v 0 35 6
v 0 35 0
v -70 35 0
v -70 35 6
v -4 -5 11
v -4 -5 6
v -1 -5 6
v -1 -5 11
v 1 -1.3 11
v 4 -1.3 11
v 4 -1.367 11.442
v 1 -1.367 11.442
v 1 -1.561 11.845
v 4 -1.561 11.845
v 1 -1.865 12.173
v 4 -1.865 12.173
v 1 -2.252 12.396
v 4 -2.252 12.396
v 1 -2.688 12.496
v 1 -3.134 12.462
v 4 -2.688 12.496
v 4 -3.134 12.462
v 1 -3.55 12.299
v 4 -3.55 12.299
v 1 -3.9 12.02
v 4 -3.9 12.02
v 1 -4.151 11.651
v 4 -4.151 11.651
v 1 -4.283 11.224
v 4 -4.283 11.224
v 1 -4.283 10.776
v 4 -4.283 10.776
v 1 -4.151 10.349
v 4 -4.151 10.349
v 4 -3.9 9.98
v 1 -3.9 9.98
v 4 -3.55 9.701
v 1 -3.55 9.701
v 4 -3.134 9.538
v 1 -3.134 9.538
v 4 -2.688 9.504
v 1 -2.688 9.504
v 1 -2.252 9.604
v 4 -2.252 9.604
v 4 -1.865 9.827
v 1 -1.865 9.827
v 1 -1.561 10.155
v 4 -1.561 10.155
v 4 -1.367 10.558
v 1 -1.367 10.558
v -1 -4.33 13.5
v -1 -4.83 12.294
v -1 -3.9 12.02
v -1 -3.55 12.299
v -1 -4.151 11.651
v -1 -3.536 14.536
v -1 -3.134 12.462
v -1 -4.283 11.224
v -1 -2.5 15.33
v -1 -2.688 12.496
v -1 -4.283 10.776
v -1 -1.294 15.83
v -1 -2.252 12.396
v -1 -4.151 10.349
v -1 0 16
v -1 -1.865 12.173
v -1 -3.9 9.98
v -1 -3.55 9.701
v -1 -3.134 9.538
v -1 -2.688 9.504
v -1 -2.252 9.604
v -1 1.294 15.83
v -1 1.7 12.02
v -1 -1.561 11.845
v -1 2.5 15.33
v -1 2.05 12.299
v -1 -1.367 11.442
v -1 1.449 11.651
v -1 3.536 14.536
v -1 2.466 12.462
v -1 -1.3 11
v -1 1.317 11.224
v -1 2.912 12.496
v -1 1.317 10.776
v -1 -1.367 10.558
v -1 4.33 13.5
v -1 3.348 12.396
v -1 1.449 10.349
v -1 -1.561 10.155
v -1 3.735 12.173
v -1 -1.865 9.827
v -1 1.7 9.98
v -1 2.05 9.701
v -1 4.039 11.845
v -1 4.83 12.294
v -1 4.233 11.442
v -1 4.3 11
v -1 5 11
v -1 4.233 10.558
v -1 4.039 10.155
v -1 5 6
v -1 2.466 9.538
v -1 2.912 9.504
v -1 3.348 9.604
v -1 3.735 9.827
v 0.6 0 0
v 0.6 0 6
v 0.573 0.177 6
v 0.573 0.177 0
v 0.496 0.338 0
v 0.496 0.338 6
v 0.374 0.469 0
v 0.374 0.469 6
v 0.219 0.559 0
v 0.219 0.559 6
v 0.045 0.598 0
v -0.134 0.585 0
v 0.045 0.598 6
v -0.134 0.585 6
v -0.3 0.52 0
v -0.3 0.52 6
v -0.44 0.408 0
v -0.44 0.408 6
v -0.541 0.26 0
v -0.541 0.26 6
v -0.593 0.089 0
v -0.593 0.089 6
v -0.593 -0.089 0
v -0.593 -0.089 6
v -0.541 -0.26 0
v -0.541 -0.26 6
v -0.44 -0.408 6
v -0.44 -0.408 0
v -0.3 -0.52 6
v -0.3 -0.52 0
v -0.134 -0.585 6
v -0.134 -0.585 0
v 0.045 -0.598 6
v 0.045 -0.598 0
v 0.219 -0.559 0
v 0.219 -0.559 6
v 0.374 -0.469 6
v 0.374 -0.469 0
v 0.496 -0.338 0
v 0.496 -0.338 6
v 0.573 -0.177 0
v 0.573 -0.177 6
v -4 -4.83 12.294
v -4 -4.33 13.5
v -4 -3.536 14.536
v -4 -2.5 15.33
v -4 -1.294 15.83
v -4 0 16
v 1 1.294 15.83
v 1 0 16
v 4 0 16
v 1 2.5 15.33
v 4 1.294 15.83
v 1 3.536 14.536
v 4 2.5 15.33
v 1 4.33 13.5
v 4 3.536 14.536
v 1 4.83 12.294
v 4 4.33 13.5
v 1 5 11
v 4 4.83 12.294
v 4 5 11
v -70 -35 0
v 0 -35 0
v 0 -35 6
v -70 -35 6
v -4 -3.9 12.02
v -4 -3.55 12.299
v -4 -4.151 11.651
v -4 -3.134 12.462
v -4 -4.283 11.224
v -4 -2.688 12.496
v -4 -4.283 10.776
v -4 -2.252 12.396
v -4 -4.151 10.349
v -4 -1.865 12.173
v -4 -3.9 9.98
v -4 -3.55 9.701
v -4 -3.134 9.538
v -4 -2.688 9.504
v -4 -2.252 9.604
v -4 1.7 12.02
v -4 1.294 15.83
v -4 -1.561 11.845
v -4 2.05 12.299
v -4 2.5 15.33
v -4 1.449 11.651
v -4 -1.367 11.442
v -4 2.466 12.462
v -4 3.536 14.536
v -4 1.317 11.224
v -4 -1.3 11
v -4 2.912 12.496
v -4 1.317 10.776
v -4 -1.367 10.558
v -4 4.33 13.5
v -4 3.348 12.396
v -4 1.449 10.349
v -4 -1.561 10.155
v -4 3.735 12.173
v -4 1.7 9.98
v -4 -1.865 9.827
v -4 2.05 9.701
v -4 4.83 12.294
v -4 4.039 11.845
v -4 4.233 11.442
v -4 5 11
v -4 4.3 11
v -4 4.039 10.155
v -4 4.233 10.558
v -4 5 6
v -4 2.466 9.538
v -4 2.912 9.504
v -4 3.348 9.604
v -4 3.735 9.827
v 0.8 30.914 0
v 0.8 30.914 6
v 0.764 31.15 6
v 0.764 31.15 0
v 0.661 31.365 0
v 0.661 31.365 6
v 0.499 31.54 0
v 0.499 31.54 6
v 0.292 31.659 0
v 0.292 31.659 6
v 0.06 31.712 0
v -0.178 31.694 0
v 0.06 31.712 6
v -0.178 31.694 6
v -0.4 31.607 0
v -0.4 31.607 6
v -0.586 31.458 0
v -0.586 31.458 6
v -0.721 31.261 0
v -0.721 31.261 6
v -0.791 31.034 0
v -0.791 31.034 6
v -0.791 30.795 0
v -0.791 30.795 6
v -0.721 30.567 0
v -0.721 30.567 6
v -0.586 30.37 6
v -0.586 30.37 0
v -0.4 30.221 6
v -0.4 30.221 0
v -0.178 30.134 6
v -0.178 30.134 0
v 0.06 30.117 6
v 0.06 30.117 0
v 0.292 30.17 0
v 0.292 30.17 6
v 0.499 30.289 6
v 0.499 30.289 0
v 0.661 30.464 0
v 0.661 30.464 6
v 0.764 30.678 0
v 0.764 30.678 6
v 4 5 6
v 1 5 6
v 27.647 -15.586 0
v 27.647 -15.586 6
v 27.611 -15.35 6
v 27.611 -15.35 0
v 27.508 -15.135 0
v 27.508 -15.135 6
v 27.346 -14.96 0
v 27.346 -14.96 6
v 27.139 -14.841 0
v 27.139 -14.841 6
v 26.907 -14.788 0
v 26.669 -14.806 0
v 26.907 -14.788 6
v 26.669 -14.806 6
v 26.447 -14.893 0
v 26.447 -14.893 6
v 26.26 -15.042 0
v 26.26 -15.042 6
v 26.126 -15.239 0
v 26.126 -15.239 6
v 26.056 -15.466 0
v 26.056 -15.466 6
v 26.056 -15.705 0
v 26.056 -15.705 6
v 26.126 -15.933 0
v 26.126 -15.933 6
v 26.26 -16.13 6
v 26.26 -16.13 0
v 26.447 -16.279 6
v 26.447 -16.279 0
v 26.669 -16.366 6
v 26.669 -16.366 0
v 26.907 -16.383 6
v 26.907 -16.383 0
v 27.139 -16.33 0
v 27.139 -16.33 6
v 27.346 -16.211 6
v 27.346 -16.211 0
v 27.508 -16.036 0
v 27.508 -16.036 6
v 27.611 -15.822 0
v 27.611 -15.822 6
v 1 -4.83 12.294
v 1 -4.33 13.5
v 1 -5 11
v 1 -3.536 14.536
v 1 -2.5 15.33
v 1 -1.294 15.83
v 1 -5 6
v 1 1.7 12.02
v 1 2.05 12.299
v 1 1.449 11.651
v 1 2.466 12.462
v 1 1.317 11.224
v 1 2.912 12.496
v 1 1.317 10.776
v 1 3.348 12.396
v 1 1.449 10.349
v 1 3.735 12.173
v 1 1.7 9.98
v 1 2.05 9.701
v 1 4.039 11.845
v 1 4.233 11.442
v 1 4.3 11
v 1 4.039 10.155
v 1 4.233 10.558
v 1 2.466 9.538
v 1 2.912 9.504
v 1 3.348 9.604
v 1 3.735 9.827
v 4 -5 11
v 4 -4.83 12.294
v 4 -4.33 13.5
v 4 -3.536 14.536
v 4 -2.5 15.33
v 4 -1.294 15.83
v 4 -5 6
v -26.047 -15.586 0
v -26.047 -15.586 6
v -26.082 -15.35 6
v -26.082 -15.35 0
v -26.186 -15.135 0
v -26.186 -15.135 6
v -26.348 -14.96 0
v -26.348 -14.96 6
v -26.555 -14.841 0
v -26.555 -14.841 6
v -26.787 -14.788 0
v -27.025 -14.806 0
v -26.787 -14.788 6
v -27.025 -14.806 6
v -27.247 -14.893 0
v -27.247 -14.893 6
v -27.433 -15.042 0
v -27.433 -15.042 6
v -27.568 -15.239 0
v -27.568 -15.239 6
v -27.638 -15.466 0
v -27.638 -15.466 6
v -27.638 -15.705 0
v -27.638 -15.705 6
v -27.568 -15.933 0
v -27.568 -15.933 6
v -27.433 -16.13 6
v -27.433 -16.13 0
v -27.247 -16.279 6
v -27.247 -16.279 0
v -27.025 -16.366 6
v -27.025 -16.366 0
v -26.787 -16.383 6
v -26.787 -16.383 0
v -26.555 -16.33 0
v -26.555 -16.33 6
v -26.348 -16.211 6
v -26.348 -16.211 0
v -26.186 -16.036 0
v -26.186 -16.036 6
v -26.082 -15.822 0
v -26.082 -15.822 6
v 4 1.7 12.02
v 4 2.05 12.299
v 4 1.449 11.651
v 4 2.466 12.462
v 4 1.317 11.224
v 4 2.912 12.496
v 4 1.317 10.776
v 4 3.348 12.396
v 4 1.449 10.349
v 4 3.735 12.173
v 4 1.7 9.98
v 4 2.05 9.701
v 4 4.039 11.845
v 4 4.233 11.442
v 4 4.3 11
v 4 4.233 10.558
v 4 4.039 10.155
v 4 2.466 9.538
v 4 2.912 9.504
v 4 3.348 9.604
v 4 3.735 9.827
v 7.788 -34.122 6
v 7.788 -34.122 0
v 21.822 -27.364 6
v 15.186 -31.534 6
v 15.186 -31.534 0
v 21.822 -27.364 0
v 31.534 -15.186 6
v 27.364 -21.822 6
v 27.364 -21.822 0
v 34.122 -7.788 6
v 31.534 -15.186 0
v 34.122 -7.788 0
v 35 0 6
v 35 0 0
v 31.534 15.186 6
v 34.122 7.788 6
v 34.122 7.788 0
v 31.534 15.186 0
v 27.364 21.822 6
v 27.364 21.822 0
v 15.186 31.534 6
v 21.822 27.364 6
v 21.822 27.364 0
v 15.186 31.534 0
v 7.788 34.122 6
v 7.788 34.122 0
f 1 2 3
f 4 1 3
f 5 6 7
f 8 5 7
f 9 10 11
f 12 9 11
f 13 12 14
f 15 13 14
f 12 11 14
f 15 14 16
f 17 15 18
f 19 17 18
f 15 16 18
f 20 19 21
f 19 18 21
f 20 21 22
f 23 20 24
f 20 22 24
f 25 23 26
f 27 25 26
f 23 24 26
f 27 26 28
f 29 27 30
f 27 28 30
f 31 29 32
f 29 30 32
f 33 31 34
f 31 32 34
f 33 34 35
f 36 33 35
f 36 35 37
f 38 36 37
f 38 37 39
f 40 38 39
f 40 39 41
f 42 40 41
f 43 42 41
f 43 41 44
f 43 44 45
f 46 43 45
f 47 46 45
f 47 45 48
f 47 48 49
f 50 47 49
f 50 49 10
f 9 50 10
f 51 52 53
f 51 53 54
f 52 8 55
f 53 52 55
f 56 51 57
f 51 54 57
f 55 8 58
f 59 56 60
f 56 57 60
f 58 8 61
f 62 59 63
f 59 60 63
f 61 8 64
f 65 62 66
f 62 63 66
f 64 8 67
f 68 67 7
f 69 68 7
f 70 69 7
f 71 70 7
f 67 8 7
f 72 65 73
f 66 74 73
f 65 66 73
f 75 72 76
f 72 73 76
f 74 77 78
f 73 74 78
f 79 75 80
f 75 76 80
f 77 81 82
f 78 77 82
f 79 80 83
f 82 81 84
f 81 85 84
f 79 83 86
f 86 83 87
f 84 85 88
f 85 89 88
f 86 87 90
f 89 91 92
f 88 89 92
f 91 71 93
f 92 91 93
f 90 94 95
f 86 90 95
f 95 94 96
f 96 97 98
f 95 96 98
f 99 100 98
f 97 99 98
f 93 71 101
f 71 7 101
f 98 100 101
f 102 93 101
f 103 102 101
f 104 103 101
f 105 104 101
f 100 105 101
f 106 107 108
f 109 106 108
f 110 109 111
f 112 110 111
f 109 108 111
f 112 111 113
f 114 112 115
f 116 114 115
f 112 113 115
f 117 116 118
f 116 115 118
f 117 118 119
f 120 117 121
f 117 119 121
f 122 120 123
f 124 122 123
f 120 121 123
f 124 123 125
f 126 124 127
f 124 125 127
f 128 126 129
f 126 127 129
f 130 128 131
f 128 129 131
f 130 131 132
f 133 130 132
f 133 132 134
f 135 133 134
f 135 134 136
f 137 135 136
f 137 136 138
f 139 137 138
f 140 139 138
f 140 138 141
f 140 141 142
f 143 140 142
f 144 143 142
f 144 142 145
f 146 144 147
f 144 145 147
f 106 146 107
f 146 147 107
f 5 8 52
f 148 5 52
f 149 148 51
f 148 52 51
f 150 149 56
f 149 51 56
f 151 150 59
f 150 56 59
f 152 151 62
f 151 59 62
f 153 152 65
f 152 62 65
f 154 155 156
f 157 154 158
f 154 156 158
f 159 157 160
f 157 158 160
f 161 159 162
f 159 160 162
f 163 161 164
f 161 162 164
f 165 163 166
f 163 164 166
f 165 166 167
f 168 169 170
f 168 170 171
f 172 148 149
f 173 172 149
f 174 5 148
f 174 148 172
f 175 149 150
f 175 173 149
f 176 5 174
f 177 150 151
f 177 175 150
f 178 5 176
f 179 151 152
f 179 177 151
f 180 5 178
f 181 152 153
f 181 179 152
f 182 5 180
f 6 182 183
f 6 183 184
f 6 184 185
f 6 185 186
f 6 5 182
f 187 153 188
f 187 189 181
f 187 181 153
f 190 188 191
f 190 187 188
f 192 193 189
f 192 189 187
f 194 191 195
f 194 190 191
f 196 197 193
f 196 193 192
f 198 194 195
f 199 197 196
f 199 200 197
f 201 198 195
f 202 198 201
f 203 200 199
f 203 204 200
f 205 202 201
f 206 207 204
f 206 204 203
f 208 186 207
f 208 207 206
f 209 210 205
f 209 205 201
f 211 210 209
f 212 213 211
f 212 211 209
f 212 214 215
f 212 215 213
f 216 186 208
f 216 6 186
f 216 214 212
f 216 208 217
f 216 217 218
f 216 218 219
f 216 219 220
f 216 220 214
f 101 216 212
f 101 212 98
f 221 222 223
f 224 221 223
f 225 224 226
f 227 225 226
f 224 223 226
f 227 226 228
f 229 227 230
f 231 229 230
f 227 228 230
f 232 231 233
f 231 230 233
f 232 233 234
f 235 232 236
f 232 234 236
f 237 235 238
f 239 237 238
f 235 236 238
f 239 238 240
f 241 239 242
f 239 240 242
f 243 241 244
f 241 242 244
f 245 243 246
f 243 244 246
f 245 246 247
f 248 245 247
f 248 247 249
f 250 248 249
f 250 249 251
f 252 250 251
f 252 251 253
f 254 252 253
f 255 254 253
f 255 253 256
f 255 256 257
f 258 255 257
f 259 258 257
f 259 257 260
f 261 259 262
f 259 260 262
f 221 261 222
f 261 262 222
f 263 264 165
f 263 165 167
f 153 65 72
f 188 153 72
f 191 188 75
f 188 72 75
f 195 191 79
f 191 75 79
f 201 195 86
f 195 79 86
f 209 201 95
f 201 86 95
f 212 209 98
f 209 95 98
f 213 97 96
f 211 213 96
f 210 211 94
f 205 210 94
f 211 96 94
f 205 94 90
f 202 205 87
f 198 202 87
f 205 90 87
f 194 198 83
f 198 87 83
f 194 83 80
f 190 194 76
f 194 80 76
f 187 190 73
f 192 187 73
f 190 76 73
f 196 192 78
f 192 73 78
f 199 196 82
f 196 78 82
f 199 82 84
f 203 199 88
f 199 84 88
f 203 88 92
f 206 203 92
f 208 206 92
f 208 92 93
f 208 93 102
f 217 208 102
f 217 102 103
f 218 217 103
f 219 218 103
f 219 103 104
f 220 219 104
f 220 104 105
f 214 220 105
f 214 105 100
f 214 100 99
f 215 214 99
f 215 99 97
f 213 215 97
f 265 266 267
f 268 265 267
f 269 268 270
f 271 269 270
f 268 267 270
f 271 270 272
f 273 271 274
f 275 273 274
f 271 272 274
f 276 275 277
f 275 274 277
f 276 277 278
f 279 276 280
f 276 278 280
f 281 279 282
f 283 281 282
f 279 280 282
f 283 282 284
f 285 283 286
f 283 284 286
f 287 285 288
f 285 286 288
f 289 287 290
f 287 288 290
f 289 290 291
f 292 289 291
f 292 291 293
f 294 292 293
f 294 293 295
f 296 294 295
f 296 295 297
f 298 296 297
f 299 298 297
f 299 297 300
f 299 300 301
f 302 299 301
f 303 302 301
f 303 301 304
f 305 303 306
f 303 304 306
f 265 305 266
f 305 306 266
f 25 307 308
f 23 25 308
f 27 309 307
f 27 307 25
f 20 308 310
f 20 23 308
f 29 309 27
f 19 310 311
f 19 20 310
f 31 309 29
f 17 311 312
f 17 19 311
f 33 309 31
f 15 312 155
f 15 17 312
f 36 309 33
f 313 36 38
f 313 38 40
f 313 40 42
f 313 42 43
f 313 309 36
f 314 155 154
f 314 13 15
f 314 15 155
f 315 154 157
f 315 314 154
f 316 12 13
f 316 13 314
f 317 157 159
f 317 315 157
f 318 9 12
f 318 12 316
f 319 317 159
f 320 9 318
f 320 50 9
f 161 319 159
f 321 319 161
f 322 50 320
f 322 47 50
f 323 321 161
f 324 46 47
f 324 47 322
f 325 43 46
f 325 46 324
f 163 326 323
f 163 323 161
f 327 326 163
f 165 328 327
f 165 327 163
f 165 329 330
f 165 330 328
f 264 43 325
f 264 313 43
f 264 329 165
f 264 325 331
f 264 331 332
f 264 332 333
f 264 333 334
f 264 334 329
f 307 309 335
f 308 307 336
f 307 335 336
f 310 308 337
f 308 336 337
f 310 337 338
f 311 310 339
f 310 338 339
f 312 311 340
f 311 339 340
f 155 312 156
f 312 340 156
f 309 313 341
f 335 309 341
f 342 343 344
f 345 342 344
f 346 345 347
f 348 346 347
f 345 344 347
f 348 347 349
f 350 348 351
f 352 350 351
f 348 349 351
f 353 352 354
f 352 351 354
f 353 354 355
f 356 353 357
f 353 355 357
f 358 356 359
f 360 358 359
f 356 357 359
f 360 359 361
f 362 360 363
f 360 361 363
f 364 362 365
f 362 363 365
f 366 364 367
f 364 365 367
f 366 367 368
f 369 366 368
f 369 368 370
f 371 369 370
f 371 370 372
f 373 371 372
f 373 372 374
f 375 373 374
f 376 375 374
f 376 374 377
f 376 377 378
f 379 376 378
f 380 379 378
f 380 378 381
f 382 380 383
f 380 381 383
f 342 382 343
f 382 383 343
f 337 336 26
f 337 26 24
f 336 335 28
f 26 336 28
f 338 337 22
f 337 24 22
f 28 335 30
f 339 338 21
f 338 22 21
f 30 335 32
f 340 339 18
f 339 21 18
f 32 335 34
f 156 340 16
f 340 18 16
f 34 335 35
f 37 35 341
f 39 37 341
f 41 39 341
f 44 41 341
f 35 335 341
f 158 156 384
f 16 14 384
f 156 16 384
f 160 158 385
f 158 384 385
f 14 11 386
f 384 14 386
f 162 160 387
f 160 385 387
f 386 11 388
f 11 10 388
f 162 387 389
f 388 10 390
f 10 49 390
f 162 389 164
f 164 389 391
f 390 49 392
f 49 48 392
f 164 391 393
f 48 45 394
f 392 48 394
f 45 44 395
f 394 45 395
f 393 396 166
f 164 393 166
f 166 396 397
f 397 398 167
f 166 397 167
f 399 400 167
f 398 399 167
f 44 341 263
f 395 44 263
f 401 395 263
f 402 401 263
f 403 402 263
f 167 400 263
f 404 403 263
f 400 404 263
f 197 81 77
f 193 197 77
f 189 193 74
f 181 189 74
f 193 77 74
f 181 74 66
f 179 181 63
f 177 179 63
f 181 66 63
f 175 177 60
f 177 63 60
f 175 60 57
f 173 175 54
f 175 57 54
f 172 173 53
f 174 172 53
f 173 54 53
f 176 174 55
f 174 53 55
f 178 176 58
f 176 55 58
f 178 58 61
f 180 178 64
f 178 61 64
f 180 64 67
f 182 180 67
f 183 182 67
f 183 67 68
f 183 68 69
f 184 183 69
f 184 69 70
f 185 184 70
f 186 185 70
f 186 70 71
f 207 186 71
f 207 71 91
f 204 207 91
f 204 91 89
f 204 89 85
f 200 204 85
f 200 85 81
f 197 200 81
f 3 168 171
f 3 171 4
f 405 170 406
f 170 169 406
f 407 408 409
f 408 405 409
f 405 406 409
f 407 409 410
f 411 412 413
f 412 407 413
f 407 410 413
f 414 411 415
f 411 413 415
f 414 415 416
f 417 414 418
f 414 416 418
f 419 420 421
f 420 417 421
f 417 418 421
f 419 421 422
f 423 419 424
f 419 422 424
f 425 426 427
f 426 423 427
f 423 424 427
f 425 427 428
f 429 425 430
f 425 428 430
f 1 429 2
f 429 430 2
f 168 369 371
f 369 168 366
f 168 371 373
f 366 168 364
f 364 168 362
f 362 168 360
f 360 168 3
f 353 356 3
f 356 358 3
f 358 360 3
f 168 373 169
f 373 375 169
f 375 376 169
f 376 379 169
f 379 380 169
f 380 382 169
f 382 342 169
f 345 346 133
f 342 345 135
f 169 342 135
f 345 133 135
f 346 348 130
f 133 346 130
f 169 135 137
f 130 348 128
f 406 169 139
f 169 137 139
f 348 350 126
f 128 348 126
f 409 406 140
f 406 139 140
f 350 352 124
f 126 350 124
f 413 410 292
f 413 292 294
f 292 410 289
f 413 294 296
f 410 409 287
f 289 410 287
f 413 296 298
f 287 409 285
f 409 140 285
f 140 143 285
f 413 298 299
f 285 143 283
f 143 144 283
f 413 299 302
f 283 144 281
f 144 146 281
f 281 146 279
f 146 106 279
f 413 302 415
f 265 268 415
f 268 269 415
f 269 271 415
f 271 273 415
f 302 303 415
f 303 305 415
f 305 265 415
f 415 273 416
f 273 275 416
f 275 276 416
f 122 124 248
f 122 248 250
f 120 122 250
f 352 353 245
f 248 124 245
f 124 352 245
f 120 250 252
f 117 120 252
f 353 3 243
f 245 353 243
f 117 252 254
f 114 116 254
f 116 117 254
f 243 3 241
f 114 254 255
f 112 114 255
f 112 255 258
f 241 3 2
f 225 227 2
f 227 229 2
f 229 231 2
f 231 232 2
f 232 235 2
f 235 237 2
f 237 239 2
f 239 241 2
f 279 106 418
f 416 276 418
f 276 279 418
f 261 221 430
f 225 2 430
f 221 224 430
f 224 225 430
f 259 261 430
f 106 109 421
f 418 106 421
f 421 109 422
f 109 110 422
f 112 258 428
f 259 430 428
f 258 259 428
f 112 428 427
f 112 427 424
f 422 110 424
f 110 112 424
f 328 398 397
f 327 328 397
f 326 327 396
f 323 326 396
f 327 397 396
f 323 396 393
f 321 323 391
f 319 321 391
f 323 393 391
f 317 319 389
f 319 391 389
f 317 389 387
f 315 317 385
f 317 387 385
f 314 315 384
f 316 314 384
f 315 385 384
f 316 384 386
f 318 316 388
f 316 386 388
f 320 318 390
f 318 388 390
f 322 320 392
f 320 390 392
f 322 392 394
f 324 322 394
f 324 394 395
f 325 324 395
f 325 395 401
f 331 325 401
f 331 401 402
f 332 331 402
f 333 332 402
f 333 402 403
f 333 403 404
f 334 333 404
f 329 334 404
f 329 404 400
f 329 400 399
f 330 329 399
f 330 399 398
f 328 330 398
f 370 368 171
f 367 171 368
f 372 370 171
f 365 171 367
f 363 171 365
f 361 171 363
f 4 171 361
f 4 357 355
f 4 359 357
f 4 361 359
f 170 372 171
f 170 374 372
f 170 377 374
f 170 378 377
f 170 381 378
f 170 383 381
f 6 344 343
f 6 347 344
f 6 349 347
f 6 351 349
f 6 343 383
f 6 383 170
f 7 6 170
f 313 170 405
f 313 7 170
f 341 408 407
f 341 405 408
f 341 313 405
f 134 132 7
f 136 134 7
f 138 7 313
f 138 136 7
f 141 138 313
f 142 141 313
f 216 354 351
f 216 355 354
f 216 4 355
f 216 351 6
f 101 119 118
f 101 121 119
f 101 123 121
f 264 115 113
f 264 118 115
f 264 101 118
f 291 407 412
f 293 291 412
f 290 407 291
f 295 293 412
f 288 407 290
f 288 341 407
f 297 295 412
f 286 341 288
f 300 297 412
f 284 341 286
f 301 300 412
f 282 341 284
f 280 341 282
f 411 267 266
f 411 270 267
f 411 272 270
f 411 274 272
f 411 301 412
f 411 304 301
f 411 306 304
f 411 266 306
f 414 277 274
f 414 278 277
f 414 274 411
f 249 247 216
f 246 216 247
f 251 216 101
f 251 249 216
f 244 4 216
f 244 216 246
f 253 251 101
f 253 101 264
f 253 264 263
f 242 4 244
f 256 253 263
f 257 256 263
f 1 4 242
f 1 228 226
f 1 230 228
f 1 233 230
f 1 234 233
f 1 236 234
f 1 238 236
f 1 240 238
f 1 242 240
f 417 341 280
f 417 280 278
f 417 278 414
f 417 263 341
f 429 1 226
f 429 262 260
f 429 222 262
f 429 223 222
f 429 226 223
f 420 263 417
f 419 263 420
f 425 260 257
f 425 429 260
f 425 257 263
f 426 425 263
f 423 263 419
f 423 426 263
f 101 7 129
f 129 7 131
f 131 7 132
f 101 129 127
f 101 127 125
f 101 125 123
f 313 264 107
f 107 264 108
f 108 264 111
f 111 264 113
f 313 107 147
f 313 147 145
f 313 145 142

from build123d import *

# Parameters (mm, degrees)
SKETCH2_R           = 35
BOSS_EXTRUDE1_DEPTH = 6
SKETCH8_W           = 70
SKETCH8_H           = 70
BOSS_EXTRUDE3_DEPTH = 6
SKETCH3_R           = 0.8
CUT_EXTRUDE1_DEPTH  = 6
SKETCH4_R           = 0.6
CUT_EXTRUDE2_DEPTH  = 6
SKETCH5_W           = 3
SKETCH5_H           = 10
BOSS_EXTRUDE2_DEPTH = 10
CUT_EXTRUDE3_DEPTH  = 84.408632647
SKETCH7_R           = 1.5
CUT_EXTRUDE4_DEPTH  = 84.408632647


with BuildPart() as part:
    # Sketch2 → Boss-Extrude1 (new body)
    with BuildSketch(Plane.XY):
        Circle(SKETCH2_R)
    extrude(amount=BOSS_EXTRUDE1_DEPTH)

    # Sketch8 → Boss-Extrude3 (add)
    with BuildSketch(Plane(origin=(0, 0, 0), x_dir=(-1, 0, 0), z_dir=(0, 0, -1))):
        with Locations((35, 0)):
            Rectangle(SKETCH8_W, SKETCH8_H)
    extrude(amount=-BOSS_EXTRUDE3_DEPTH)

    # Sketch3 → Cut-Extrude1 (cut)
    with BuildSketch(Plane.XY.offset(6)):
        with Locations((0, 30.914278185)):
            Circle(SKETCH3_R)
        with Locations((26.846787517, -15.585721815)):
            Circle(SKETCH3_R)
        with Locations((-26.846787517, -15.585721815)):
            Circle(SKETCH3_R)
    extrude(amount=-CUT_EXTRUDE1_DEPTH, mode=Mode.SUBTRACT)

    # Sketch4 → Cut-Extrude2 (cut)
    with BuildSketch(Plane.XY.offset(6)):
        Circle(SKETCH4_R)
    extrude(amount=-CUT_EXTRUDE2_DEPTH, mode=Mode.SUBTRACT)

    # Sketch5 → Boss-Extrude2 (add)
    with BuildSketch(Plane.XY.offset(6)):
        with Locations((2.5, 0)):
            Rectangle(SKETCH5_W, SKETCH5_H)
        with Locations((-2.5, 0)):
            Rectangle(SKETCH5_W, SKETCH5_H)
    extrude(amount=BOSS_EXTRUDE2_DEPTH)

    # Sketch6 → Cut-Extrude3 (cut, through all)
    with BuildSketch(Plane(origin=(4, 0, 0), x_dir=(0, 0, -1), z_dir=(1, 0, 0))):
        with BuildLine():
            ThreePointArc((-16, 0), (-14.535533906, 3.535533906), (-11, 5))
            Line((-11, 5), (-16, 5))
            Line((-16, 5), (-16, 0))
        make_face()
        with BuildLine():
            ThreePointArc((-11, -5), (-14.535533906, -3.535533906), (-16, 0))
            Line((-16, 0), (-16, -5))
            Line((-16, -5), (-11, -5))
        make_face()
    extrude(amount=-CUT_EXTRUDE3_DEPTH, mode=Mode.SUBTRACT)

    # Sketch7 → Cut-Extrude4 (cut, through all)
    with BuildSketch(Plane(origin=(4, 0, 0), x_dir=(0, 0, -1), z_dir=(1, 0, 0))):
        with Locations(Location((-11, 2.8, 0), (0, 0, 90))):
            Circle(SKETCH7_R)
        with Locations(Location((-11, -2.8, 0), (0, 0, 90))):
            Circle(SKETCH7_R)
    extrude(amount=-CUT_EXTRUDE4_DEPTH, mode=Mode.SUBTRACT)


solid = part.part
